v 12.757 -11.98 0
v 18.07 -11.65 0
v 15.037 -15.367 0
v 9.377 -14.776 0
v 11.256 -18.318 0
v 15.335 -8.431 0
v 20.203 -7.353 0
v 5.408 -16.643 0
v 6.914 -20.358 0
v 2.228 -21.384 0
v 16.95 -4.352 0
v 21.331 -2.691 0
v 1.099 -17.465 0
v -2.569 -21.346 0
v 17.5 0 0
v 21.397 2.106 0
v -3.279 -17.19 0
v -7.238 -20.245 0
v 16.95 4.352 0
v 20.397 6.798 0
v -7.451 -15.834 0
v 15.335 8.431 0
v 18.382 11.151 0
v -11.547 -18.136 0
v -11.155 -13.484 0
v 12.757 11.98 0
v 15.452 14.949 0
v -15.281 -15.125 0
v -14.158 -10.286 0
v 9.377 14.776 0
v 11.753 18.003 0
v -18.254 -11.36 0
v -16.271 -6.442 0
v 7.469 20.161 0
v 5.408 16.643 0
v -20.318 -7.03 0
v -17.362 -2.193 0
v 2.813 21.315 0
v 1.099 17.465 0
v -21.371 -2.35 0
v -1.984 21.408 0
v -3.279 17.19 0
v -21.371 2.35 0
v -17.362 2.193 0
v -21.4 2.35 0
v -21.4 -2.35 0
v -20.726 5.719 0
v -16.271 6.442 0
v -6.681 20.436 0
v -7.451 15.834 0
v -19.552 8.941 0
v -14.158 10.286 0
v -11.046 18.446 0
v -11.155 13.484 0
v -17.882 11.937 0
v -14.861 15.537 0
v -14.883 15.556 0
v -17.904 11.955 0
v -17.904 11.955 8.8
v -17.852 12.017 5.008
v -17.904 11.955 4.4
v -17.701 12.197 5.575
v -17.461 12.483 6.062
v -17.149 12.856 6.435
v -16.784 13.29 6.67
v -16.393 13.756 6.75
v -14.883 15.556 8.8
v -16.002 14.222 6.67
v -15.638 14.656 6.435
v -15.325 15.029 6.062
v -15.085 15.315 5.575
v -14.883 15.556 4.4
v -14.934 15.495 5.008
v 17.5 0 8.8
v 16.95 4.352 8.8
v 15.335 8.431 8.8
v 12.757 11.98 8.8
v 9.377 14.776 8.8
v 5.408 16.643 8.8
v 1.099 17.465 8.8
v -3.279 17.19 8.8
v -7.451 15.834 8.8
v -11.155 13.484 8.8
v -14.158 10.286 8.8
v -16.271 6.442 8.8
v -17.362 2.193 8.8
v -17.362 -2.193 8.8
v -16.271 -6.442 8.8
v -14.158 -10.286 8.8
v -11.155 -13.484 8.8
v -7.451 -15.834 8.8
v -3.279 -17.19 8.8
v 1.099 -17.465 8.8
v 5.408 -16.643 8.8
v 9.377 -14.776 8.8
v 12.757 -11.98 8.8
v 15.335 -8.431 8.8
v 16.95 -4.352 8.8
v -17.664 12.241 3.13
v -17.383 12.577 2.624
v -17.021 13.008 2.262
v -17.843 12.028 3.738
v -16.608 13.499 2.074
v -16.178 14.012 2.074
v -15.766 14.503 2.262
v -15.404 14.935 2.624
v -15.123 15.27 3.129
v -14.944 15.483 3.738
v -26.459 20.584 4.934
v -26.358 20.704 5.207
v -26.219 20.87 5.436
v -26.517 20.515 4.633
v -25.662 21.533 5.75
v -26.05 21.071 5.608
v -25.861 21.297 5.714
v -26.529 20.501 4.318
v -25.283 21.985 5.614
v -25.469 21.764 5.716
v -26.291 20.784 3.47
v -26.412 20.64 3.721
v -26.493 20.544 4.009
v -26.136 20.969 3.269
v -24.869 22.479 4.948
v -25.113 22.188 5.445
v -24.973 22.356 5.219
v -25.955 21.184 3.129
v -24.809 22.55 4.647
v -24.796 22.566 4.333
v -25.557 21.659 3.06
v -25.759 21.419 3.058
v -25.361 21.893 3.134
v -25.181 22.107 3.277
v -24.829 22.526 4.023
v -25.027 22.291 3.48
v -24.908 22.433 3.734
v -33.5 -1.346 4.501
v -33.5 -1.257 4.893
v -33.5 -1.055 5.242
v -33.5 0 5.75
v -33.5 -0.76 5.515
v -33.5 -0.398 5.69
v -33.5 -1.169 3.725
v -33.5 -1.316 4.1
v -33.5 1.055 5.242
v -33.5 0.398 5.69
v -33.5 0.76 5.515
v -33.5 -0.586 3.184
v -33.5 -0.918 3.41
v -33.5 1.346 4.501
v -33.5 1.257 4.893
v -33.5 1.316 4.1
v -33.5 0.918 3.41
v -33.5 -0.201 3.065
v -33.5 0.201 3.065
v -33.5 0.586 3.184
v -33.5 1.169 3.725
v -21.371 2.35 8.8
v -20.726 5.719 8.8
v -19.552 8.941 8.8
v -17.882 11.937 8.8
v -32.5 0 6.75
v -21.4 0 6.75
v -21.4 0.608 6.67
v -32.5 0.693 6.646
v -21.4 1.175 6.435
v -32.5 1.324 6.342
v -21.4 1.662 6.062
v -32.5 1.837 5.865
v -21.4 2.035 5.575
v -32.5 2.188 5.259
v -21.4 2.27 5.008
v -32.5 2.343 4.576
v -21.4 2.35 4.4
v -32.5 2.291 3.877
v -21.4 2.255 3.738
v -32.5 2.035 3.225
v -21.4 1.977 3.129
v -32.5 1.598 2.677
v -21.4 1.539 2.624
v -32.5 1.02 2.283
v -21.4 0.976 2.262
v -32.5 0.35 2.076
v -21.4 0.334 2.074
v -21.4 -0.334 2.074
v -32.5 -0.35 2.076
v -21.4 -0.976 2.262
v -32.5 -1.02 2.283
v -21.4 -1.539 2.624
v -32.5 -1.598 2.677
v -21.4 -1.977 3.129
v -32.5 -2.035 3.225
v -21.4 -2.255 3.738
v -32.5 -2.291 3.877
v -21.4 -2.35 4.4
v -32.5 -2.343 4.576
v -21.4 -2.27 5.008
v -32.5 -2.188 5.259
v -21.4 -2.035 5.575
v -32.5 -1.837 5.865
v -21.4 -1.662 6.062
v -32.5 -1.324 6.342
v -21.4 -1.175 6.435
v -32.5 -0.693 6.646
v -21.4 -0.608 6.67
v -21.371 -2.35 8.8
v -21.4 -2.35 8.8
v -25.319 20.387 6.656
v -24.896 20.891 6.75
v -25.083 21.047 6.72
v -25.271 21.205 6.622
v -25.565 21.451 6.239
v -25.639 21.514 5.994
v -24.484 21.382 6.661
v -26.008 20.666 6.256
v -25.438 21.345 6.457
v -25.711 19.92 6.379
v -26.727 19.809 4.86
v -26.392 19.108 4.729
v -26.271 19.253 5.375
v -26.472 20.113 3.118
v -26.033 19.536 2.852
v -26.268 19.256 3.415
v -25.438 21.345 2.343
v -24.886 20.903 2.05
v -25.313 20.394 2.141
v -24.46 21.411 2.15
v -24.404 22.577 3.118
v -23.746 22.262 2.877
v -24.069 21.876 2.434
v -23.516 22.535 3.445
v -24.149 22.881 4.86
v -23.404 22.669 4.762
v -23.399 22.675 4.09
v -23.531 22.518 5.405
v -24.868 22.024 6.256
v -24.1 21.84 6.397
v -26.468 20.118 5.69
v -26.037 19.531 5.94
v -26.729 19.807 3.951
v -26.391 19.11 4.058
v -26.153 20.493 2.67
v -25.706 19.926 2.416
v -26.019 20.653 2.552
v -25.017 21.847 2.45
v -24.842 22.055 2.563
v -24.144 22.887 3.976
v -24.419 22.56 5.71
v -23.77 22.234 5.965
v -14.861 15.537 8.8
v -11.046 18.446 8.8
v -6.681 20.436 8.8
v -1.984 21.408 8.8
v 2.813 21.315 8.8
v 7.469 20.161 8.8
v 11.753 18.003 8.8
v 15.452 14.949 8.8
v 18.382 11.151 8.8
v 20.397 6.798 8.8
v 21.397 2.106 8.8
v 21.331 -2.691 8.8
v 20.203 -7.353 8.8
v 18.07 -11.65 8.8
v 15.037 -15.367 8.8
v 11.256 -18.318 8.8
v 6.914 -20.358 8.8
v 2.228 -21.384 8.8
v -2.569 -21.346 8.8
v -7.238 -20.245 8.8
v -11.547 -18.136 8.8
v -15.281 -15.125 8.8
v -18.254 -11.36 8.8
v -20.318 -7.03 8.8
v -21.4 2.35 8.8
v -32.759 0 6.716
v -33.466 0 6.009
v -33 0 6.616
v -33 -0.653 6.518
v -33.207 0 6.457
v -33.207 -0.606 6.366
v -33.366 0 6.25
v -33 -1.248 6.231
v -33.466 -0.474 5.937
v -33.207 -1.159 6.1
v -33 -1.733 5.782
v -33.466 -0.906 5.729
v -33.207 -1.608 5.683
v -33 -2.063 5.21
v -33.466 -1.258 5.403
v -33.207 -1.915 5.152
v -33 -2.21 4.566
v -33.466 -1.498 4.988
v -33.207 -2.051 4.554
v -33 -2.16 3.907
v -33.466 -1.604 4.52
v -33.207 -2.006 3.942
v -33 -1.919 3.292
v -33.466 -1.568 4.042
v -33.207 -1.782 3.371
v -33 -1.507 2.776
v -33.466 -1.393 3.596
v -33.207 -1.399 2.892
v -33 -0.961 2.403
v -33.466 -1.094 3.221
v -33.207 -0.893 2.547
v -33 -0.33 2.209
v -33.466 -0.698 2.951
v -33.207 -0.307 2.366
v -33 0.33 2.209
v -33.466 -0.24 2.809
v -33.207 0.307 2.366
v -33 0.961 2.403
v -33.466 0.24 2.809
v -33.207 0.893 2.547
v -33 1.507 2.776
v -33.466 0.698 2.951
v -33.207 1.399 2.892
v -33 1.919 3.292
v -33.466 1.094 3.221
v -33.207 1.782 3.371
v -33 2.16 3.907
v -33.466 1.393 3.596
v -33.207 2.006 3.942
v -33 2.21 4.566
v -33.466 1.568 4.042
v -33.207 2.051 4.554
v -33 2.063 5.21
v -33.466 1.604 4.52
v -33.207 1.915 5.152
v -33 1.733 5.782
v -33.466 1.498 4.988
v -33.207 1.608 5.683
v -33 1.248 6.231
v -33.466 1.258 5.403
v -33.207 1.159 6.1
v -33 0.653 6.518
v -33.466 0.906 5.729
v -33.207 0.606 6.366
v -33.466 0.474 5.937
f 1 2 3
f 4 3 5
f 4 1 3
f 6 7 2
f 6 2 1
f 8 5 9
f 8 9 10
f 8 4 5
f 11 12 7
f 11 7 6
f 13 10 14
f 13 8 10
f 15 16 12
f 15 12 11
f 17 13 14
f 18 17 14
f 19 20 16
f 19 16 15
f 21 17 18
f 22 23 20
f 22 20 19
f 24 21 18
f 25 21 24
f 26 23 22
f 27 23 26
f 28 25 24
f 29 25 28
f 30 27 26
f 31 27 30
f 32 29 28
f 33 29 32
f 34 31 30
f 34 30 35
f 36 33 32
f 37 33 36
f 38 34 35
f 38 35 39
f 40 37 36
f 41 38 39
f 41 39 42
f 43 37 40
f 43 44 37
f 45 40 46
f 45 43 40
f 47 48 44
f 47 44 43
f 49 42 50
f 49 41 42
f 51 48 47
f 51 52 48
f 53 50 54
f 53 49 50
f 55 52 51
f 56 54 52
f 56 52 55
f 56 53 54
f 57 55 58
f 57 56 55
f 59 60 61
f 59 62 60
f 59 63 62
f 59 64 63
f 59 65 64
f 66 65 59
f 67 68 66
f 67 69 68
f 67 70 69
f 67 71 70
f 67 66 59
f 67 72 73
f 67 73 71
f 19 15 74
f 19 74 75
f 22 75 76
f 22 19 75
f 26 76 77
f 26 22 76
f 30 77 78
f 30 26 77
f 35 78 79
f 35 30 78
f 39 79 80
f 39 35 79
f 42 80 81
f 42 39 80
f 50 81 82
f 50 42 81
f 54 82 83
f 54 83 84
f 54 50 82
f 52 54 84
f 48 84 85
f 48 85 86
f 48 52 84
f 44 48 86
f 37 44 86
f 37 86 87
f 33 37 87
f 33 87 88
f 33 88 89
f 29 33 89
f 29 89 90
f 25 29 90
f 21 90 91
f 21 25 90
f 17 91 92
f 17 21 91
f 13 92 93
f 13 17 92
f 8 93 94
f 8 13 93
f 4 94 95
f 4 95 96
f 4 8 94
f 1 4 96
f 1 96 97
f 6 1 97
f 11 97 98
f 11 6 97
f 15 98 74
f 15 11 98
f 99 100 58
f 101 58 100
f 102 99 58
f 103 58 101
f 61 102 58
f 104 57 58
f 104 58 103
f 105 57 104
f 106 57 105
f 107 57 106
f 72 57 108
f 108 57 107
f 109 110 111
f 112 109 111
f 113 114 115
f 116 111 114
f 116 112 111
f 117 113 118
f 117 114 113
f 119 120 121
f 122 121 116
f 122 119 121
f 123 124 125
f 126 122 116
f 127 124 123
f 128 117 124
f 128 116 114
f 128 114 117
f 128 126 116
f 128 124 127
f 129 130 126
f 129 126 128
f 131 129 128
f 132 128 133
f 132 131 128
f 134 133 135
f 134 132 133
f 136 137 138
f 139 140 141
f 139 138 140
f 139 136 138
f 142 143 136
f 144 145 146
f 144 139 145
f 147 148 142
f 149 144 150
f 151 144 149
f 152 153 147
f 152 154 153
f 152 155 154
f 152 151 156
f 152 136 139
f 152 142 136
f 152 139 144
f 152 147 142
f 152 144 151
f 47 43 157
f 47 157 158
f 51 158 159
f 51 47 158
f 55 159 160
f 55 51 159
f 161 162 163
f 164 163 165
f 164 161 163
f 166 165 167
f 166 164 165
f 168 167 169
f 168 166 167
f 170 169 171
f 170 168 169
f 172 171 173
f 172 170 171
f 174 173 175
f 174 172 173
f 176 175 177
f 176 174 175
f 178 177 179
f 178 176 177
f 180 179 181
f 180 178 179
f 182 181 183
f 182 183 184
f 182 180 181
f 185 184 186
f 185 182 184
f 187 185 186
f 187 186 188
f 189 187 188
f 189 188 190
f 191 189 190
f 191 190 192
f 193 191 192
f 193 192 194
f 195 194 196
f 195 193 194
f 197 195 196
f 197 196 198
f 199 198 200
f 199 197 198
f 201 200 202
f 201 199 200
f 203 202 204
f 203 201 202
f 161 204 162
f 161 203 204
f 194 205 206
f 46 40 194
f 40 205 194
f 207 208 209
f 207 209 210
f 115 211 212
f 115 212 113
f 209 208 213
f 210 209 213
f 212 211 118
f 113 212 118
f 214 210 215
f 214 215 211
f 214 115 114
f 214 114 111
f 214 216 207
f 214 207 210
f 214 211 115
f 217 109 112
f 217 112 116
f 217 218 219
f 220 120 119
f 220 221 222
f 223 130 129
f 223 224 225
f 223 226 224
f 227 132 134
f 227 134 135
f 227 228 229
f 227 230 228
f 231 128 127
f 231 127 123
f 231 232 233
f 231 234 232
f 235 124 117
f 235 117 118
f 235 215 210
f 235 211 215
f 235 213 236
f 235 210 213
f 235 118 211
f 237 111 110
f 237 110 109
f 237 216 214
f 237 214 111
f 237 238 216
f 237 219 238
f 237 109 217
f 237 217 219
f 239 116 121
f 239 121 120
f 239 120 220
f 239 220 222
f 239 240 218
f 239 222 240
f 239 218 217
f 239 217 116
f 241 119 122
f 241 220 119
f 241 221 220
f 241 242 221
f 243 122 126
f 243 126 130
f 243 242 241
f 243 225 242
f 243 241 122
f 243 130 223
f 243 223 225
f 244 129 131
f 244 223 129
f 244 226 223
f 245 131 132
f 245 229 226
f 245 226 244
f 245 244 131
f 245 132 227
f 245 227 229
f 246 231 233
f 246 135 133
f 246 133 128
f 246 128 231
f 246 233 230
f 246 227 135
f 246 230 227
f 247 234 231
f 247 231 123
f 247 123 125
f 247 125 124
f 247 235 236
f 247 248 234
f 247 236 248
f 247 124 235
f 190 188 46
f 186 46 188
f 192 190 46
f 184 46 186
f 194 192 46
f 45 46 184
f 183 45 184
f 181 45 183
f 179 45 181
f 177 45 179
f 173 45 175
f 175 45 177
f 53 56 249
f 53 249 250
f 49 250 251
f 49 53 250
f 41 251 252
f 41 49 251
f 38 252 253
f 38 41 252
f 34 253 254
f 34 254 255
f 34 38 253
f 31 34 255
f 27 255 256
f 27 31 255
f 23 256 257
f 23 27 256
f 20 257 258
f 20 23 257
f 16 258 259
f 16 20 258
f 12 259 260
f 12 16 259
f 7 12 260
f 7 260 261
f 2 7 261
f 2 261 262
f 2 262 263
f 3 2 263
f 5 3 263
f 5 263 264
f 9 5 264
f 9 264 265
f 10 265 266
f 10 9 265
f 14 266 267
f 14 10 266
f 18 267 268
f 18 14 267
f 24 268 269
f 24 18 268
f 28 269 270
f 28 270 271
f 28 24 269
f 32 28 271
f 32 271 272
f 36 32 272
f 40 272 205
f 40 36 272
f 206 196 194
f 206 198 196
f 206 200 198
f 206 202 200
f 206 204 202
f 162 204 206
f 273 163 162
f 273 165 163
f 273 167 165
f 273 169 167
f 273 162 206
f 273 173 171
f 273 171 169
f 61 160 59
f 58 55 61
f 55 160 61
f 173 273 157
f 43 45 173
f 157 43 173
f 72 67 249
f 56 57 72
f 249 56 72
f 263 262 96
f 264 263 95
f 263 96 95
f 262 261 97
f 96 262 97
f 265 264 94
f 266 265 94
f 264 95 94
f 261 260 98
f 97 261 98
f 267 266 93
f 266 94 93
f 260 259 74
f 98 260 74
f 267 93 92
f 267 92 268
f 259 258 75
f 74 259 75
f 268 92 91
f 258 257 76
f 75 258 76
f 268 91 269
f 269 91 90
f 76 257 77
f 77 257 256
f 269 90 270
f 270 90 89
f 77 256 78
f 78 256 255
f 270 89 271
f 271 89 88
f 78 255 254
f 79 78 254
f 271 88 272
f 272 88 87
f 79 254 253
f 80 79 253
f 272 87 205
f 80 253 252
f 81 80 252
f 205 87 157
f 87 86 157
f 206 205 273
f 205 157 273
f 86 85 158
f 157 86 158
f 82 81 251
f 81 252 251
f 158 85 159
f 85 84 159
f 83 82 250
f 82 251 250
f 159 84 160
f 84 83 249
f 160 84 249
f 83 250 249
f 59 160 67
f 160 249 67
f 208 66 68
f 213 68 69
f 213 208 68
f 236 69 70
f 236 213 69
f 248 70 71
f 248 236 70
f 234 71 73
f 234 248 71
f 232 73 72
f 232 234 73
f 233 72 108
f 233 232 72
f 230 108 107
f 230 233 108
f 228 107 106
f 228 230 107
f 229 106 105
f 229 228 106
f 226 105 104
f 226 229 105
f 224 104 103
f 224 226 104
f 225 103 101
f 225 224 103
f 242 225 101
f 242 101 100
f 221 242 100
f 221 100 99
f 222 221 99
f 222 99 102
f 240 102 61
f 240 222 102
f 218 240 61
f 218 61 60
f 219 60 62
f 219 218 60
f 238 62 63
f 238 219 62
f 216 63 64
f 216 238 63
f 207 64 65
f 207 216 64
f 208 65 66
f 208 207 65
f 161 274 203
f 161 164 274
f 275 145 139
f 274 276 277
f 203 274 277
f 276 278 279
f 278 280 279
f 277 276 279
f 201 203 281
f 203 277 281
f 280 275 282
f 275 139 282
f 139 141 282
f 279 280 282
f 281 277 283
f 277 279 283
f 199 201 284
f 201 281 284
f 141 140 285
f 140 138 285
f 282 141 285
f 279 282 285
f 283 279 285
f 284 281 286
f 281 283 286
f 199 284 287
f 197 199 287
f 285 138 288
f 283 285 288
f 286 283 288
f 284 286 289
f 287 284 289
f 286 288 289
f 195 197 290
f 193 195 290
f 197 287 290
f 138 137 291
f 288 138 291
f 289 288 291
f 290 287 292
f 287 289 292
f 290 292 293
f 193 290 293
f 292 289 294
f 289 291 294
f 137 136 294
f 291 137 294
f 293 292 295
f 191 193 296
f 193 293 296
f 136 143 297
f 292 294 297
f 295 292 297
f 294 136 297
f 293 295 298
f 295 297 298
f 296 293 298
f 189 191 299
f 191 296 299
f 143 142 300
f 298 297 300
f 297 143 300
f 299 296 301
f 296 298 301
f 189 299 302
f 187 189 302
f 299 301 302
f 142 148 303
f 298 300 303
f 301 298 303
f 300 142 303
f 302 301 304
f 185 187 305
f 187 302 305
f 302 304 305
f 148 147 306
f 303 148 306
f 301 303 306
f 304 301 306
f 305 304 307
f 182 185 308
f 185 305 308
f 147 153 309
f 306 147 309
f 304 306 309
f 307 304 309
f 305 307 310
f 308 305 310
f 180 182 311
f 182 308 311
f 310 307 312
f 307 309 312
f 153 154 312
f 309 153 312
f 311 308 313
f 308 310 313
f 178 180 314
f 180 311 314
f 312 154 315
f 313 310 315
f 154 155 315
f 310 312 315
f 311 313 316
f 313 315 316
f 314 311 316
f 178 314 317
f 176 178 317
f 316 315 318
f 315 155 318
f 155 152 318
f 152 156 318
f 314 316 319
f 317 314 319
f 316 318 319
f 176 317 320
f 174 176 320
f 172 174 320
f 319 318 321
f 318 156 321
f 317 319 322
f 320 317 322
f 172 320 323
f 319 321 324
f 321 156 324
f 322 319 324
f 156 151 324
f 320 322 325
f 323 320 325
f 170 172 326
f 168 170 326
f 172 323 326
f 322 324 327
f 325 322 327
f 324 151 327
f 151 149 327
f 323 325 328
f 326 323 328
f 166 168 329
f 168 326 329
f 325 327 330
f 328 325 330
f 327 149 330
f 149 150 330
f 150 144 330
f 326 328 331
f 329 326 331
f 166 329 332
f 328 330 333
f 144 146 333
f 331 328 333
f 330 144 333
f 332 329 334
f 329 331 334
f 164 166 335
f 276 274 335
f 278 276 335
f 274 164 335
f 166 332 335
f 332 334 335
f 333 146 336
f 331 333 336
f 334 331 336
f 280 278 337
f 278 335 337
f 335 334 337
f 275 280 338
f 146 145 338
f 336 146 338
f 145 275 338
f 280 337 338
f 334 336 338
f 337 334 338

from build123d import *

# Parameters (mm, degrees)
ESQUISSE1_R             = 17.5
BOSS_EXTRU_1_DEPTH      = 8.8
ESQUISSE4_R             = 6.373182781
ESQUISSE4_R_2           = 2.35
ENL_V_MAT_EXTRU_1_DEPTH = 12.1
ESQUISSE5_R             = 10.689407939
ESQUISSE5_R_2           = 2.35
ENL_V_MAT_EXTRU_2_DEPTH = 12.1
CONG_1_R                = 1


with BuildPart() as part:
    # Esquisse1 → Boss.-Extru.1 (new body)
    with BuildSketch(Plane.XY):
        with BuildLine():
            Line((-33.5, 2.35), (-21.5, 2.35))
            Line((-21.5, 2.35), (-21.37118387, 2.35))
            ThreePointArc((-21.37118387, 2.35), (-20.203391347, 7.353433082), (-17.881827529, 11.936927755))
            Line((-17.881827529, 11.936927755), (-27.173039727, 19.733180483))
            Line((-27.173039727, 19.733180483), (-24.151937962, 23.333589366))
            Line((-24.151937962, 23.333589366), (-14.860725764, 15.537336637))
            ThreePointArc((-14.860725764, 15.537336637), (20.203391347, -7.353433082), (-21.37118387, -2.35))
            Line((-21.37118387, -2.35), (-21.5, -2.35))
            Line((-21.5, -2.35), (-33.5, -2.35))
            Line((-33.5, -2.35), (-33.5, 2.35))
        make_face()
        Circle(ESQUISSE1_R, mode=Mode.SUBTRACT)
    extrude(amount=BOSS_EXTRU_1_DEPTH)

    # Esquisse4 → Enlèv. mat.-Extru.1 (cut)
    with BuildSketch(Plane(origin=(-25.662488844, 21.533384924, 0), x_dir=(0, 0, 1), z_dir=(-0.766044443, 0.64278761, 0))):
        with Locations((4.4, 0)):
            Circle(ESQUISSE4_R)
        with Locations((4.4, 0)):
            Circle(ESQUISSE4_R_2, mode=Mode.SUBTRACT)
    extrude(amount=-ENL_V_MAT_EXTRU_1_DEPTH, mode=Mode.SUBTRACT)

    # Esquisse5 → Enlèv. mat.-Extru.2 (cut)
    with BuildSketch(Plane.ZY.offset(33.5)):
        with Locations((4.4, 0)):
            Circle(ESQUISSE5_R)
        with Locations((4.4, 0)):
            Circle(ESQUISSE5_R_2, mode=Mode.SUBTRACT)
    extrude(amount=-ENL_V_MAT_EXTRU_2_DEPTH, mode=Mode.SUBTRACT)

    # Congé1
    cong_1_edges = [part.edges().sort_by_distance(p)[0] for p in [
        (-25.662488844, 21.533384924, 2.05),
        (-33.5, 0, 2.05),
    ]]
    fillet(cong_1_edges, radius=CONG_1_R)


solid = part.part
